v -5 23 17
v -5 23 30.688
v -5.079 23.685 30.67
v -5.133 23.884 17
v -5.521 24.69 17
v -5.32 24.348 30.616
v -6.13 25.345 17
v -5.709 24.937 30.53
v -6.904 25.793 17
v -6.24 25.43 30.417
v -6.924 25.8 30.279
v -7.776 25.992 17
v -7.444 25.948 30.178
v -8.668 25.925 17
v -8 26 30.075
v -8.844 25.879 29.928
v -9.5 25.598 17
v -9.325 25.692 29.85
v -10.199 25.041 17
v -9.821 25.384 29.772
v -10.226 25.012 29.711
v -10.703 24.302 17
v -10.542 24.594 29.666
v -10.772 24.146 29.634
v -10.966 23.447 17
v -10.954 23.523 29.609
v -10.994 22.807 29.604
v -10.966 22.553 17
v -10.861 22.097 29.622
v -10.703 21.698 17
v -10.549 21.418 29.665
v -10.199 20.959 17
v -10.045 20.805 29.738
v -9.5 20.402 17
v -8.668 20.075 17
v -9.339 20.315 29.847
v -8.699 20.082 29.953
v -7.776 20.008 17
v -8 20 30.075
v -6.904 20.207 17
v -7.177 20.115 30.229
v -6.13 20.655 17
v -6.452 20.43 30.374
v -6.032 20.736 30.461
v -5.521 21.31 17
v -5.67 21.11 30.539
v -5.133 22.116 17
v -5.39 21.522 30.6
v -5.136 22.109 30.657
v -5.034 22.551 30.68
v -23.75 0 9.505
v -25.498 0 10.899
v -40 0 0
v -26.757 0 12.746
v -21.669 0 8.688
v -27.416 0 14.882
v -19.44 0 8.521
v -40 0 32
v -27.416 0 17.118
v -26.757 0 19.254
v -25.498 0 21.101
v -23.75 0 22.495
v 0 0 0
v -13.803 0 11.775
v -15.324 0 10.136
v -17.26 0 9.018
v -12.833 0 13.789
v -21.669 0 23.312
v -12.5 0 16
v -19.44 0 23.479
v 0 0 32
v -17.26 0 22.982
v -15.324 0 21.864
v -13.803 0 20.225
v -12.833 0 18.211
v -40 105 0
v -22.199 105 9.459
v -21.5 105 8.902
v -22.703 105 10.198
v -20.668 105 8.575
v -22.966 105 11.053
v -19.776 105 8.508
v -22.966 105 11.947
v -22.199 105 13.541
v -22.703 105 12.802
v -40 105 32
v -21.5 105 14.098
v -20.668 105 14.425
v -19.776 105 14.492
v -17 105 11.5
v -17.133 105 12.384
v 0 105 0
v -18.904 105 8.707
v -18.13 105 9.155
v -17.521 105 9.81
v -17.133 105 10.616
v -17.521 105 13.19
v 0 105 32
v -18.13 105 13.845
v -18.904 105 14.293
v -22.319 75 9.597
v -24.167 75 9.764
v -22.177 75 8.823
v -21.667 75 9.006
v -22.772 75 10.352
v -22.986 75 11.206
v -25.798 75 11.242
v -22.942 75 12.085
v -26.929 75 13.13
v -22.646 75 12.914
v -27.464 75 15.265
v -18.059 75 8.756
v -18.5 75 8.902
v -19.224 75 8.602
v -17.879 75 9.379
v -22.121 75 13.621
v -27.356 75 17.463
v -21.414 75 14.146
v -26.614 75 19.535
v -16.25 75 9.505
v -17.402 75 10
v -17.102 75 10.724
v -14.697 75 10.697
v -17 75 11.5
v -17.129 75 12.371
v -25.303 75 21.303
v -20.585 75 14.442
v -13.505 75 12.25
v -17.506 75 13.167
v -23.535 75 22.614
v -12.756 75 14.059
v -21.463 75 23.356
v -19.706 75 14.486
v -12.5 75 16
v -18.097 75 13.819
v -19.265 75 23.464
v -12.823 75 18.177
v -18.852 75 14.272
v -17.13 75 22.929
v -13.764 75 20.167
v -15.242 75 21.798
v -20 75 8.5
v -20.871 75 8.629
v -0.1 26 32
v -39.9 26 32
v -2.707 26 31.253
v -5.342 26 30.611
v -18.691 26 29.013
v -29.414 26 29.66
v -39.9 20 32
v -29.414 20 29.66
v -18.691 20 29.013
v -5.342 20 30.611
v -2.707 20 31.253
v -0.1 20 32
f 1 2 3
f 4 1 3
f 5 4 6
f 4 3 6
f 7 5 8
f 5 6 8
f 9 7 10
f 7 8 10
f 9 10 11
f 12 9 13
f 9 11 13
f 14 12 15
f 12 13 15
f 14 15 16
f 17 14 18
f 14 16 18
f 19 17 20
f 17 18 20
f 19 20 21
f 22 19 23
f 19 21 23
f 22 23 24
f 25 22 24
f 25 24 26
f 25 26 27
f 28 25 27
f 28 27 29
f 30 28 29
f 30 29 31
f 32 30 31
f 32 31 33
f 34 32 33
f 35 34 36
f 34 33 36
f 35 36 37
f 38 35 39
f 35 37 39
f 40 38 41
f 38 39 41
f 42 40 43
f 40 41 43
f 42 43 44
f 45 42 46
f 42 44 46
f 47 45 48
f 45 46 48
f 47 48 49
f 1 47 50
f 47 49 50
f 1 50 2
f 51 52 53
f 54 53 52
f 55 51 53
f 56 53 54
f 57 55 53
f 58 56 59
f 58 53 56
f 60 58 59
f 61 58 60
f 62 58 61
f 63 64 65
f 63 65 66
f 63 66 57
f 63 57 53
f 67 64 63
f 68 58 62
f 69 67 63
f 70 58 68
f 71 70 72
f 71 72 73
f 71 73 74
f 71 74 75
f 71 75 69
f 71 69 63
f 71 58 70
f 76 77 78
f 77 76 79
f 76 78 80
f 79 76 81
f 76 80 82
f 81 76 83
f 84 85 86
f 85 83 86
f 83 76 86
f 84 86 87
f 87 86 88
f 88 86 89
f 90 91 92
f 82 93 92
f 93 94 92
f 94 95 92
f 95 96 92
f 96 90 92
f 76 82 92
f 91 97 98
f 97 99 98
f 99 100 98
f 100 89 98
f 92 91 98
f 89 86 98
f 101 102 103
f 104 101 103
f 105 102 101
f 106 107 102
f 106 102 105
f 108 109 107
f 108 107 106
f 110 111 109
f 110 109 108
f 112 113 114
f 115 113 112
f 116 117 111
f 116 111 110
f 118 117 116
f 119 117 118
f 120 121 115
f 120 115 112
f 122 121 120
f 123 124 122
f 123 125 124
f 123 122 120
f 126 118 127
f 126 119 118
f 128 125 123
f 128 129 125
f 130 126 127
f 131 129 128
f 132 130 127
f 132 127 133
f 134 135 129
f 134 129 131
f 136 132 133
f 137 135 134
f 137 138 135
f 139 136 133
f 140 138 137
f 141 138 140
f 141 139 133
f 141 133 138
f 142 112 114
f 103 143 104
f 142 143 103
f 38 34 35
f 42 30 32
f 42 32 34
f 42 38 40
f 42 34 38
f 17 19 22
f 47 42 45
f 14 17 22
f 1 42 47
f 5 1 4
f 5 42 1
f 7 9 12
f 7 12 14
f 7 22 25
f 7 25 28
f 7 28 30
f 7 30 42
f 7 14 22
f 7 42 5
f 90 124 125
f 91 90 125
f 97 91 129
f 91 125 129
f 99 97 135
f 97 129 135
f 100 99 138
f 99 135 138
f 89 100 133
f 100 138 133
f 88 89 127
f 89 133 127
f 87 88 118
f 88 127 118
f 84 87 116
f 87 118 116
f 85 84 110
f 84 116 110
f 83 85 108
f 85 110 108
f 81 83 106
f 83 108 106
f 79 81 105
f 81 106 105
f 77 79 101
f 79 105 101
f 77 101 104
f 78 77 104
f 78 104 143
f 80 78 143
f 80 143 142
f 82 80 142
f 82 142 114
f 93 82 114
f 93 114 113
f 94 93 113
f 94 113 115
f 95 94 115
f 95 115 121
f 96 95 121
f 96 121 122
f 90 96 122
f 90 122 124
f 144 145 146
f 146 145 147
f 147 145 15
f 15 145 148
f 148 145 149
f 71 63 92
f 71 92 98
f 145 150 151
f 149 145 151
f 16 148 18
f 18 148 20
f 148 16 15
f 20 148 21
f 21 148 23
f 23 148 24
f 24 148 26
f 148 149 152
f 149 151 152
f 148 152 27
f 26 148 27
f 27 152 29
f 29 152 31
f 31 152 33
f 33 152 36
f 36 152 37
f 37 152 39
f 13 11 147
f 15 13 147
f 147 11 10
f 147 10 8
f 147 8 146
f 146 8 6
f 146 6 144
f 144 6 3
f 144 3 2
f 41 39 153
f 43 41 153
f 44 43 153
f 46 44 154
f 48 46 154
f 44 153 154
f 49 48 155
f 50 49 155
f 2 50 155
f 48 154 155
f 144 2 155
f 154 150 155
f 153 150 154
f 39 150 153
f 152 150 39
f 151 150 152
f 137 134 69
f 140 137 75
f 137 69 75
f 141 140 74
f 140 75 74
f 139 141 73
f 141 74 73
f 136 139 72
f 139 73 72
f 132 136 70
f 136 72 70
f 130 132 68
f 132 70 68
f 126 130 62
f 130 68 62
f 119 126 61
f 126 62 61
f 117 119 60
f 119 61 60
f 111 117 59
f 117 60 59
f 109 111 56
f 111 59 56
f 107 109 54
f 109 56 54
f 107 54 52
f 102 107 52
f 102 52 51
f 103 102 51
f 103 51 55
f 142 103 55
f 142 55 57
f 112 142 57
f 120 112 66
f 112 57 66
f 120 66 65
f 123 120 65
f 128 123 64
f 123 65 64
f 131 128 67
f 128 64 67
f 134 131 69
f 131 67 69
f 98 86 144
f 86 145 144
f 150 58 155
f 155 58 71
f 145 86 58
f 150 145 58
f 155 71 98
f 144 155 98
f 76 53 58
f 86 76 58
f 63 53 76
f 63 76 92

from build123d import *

# Parameters (mm, degrees)
F0_W      = 40
F0_H      = 32
F1_DEPTH  = 105
F2_R      = 7.5
F3_DEPTH  = 75
F4_R      = 3
F5_DEPTH  = 105.001
F7_R      = 67.5
F8_DEPTH  = 6
F10_R     = 3
F11_DEPTH = 15


with BuildPart() as f1:
    # F0 (on Front) → F1 (new body)
    with BuildSketch(Plane.XZ):
        with Locations((-20, 16)):
            Rectangle(F0_W, F0_H)
    extrude(amount=-F1_DEPTH)

    # F2 (on face) → F3 (cut)
    with BuildSketch(Plane.XZ):
        with Locations((-20, 16)):
            Circle(F2_R)
    extrude(amount=-F3_DEPTH, mode=Mode.SUBTRACT)

    # F4 (on Front) → F5 (cut, through all)
    with BuildSketch(Plane.XZ):
        with Locations((-20, 11.5)):
            Circle(F4_R)
    extrude(amount=-F5_DEPTH, mode=Mode.SUBTRACT)

    # F7 (on offset) → F8 (cut)
    with BuildSketch(Plane.XZ.offset(-20)):
        with Locations((-20, 96.5)):
            Circle(F7_R)
    extrude(amount=-F8_DEPTH, mode=Mode.SUBTRACT)

    # F10 (on offset) → F11 (cut)
    with BuildSketch(Plane.XY.offset(32)):
        with Locations((-8, 23)):
            Circle(F10_R)
    extrude(amount=-F11_DEPTH, mode=Mode.SUBTRACT)


solid = f1.part
